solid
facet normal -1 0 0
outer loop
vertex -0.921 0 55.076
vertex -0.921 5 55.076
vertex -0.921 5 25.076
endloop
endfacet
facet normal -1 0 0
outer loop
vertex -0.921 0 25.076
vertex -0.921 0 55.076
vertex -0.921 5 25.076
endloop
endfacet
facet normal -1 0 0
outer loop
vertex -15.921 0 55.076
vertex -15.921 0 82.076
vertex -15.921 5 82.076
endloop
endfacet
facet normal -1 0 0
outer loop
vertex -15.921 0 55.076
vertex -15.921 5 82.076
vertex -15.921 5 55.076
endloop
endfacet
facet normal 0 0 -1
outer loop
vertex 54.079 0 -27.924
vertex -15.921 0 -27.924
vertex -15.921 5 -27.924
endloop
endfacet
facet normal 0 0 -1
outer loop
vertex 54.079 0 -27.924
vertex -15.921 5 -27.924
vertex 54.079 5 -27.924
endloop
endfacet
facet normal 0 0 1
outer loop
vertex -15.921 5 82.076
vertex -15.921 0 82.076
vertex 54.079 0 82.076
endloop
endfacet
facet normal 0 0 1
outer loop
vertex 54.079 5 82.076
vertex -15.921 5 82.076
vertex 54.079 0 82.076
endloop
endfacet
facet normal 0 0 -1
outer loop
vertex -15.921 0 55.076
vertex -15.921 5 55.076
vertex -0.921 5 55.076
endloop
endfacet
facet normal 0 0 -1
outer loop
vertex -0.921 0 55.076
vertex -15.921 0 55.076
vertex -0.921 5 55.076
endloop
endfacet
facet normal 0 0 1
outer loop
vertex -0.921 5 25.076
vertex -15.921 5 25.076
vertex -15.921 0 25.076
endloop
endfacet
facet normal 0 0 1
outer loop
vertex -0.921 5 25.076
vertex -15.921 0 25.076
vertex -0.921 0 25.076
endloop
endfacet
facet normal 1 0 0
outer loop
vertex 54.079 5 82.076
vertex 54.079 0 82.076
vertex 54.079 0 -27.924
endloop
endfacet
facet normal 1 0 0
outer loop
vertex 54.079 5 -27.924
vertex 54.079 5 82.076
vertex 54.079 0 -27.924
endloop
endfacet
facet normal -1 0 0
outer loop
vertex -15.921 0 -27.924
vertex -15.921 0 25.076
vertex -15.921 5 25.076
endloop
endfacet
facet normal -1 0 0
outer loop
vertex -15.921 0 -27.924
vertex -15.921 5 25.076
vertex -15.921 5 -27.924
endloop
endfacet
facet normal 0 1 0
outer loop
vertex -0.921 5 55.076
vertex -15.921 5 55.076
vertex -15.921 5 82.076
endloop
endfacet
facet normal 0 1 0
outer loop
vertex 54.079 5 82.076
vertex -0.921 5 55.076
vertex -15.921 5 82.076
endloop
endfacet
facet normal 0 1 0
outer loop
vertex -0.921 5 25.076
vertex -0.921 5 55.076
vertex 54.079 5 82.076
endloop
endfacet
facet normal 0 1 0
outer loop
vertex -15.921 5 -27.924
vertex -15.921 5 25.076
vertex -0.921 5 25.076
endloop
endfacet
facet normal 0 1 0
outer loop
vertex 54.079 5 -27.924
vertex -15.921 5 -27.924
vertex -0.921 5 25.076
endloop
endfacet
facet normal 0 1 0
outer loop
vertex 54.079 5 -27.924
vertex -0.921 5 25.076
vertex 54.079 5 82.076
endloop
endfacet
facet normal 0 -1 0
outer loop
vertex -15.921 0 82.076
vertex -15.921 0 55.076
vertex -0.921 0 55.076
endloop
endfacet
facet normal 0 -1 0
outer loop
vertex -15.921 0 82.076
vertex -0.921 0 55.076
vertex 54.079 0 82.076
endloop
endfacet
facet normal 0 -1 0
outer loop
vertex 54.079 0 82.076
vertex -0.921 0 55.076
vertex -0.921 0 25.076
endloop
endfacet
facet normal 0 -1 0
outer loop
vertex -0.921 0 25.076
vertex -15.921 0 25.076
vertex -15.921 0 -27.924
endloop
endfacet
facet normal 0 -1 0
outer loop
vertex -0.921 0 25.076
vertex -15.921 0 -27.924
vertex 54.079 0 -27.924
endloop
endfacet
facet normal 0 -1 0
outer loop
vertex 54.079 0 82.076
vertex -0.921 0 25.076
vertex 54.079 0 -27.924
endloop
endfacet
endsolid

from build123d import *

# Parameters (mm, degrees)
CROQUIS1_W              = 70
CROQUIS1_H              = 110
SALIENTE_EXTRUIR1_DEPTH = 5
CROQUIS2_W              = 15
CROQUIS2_H              = 30
CORTAR_EXTRUIR1_DEPTH   = 99.417594391


with BuildPart() as part:
    # Croquis1 → Saliente-Extruir1 (new body)
    with BuildSketch(Plane(origin=(0, 0, 0), x_dir=(1, 0, 0), z_dir=(0, 1, 0))):
        with Locations((19.079422383, -27.075812274)):
            Rectangle(CROQUIS1_W, CROQUIS1_H)
    extrude(amount=SALIENTE_EXTRUIR1_DEPTH)

    # Croquis2 → Cortar-Extruir1 (cut, through all)
    with BuildSketch(Plane(origin=(0, 5, 0), x_dir=(1, 0, 0), z_dir=(0, 1, 0))):
        with Locations((-8.420577617, -40.075812274)):
            Rectangle(CROQUIS2_W, CROQUIS2_H)
    extrude(amount=-CORTAR_EXTRUIR1_DEPTH, mode=Mode.SUBTRACT)


solid = part.part
